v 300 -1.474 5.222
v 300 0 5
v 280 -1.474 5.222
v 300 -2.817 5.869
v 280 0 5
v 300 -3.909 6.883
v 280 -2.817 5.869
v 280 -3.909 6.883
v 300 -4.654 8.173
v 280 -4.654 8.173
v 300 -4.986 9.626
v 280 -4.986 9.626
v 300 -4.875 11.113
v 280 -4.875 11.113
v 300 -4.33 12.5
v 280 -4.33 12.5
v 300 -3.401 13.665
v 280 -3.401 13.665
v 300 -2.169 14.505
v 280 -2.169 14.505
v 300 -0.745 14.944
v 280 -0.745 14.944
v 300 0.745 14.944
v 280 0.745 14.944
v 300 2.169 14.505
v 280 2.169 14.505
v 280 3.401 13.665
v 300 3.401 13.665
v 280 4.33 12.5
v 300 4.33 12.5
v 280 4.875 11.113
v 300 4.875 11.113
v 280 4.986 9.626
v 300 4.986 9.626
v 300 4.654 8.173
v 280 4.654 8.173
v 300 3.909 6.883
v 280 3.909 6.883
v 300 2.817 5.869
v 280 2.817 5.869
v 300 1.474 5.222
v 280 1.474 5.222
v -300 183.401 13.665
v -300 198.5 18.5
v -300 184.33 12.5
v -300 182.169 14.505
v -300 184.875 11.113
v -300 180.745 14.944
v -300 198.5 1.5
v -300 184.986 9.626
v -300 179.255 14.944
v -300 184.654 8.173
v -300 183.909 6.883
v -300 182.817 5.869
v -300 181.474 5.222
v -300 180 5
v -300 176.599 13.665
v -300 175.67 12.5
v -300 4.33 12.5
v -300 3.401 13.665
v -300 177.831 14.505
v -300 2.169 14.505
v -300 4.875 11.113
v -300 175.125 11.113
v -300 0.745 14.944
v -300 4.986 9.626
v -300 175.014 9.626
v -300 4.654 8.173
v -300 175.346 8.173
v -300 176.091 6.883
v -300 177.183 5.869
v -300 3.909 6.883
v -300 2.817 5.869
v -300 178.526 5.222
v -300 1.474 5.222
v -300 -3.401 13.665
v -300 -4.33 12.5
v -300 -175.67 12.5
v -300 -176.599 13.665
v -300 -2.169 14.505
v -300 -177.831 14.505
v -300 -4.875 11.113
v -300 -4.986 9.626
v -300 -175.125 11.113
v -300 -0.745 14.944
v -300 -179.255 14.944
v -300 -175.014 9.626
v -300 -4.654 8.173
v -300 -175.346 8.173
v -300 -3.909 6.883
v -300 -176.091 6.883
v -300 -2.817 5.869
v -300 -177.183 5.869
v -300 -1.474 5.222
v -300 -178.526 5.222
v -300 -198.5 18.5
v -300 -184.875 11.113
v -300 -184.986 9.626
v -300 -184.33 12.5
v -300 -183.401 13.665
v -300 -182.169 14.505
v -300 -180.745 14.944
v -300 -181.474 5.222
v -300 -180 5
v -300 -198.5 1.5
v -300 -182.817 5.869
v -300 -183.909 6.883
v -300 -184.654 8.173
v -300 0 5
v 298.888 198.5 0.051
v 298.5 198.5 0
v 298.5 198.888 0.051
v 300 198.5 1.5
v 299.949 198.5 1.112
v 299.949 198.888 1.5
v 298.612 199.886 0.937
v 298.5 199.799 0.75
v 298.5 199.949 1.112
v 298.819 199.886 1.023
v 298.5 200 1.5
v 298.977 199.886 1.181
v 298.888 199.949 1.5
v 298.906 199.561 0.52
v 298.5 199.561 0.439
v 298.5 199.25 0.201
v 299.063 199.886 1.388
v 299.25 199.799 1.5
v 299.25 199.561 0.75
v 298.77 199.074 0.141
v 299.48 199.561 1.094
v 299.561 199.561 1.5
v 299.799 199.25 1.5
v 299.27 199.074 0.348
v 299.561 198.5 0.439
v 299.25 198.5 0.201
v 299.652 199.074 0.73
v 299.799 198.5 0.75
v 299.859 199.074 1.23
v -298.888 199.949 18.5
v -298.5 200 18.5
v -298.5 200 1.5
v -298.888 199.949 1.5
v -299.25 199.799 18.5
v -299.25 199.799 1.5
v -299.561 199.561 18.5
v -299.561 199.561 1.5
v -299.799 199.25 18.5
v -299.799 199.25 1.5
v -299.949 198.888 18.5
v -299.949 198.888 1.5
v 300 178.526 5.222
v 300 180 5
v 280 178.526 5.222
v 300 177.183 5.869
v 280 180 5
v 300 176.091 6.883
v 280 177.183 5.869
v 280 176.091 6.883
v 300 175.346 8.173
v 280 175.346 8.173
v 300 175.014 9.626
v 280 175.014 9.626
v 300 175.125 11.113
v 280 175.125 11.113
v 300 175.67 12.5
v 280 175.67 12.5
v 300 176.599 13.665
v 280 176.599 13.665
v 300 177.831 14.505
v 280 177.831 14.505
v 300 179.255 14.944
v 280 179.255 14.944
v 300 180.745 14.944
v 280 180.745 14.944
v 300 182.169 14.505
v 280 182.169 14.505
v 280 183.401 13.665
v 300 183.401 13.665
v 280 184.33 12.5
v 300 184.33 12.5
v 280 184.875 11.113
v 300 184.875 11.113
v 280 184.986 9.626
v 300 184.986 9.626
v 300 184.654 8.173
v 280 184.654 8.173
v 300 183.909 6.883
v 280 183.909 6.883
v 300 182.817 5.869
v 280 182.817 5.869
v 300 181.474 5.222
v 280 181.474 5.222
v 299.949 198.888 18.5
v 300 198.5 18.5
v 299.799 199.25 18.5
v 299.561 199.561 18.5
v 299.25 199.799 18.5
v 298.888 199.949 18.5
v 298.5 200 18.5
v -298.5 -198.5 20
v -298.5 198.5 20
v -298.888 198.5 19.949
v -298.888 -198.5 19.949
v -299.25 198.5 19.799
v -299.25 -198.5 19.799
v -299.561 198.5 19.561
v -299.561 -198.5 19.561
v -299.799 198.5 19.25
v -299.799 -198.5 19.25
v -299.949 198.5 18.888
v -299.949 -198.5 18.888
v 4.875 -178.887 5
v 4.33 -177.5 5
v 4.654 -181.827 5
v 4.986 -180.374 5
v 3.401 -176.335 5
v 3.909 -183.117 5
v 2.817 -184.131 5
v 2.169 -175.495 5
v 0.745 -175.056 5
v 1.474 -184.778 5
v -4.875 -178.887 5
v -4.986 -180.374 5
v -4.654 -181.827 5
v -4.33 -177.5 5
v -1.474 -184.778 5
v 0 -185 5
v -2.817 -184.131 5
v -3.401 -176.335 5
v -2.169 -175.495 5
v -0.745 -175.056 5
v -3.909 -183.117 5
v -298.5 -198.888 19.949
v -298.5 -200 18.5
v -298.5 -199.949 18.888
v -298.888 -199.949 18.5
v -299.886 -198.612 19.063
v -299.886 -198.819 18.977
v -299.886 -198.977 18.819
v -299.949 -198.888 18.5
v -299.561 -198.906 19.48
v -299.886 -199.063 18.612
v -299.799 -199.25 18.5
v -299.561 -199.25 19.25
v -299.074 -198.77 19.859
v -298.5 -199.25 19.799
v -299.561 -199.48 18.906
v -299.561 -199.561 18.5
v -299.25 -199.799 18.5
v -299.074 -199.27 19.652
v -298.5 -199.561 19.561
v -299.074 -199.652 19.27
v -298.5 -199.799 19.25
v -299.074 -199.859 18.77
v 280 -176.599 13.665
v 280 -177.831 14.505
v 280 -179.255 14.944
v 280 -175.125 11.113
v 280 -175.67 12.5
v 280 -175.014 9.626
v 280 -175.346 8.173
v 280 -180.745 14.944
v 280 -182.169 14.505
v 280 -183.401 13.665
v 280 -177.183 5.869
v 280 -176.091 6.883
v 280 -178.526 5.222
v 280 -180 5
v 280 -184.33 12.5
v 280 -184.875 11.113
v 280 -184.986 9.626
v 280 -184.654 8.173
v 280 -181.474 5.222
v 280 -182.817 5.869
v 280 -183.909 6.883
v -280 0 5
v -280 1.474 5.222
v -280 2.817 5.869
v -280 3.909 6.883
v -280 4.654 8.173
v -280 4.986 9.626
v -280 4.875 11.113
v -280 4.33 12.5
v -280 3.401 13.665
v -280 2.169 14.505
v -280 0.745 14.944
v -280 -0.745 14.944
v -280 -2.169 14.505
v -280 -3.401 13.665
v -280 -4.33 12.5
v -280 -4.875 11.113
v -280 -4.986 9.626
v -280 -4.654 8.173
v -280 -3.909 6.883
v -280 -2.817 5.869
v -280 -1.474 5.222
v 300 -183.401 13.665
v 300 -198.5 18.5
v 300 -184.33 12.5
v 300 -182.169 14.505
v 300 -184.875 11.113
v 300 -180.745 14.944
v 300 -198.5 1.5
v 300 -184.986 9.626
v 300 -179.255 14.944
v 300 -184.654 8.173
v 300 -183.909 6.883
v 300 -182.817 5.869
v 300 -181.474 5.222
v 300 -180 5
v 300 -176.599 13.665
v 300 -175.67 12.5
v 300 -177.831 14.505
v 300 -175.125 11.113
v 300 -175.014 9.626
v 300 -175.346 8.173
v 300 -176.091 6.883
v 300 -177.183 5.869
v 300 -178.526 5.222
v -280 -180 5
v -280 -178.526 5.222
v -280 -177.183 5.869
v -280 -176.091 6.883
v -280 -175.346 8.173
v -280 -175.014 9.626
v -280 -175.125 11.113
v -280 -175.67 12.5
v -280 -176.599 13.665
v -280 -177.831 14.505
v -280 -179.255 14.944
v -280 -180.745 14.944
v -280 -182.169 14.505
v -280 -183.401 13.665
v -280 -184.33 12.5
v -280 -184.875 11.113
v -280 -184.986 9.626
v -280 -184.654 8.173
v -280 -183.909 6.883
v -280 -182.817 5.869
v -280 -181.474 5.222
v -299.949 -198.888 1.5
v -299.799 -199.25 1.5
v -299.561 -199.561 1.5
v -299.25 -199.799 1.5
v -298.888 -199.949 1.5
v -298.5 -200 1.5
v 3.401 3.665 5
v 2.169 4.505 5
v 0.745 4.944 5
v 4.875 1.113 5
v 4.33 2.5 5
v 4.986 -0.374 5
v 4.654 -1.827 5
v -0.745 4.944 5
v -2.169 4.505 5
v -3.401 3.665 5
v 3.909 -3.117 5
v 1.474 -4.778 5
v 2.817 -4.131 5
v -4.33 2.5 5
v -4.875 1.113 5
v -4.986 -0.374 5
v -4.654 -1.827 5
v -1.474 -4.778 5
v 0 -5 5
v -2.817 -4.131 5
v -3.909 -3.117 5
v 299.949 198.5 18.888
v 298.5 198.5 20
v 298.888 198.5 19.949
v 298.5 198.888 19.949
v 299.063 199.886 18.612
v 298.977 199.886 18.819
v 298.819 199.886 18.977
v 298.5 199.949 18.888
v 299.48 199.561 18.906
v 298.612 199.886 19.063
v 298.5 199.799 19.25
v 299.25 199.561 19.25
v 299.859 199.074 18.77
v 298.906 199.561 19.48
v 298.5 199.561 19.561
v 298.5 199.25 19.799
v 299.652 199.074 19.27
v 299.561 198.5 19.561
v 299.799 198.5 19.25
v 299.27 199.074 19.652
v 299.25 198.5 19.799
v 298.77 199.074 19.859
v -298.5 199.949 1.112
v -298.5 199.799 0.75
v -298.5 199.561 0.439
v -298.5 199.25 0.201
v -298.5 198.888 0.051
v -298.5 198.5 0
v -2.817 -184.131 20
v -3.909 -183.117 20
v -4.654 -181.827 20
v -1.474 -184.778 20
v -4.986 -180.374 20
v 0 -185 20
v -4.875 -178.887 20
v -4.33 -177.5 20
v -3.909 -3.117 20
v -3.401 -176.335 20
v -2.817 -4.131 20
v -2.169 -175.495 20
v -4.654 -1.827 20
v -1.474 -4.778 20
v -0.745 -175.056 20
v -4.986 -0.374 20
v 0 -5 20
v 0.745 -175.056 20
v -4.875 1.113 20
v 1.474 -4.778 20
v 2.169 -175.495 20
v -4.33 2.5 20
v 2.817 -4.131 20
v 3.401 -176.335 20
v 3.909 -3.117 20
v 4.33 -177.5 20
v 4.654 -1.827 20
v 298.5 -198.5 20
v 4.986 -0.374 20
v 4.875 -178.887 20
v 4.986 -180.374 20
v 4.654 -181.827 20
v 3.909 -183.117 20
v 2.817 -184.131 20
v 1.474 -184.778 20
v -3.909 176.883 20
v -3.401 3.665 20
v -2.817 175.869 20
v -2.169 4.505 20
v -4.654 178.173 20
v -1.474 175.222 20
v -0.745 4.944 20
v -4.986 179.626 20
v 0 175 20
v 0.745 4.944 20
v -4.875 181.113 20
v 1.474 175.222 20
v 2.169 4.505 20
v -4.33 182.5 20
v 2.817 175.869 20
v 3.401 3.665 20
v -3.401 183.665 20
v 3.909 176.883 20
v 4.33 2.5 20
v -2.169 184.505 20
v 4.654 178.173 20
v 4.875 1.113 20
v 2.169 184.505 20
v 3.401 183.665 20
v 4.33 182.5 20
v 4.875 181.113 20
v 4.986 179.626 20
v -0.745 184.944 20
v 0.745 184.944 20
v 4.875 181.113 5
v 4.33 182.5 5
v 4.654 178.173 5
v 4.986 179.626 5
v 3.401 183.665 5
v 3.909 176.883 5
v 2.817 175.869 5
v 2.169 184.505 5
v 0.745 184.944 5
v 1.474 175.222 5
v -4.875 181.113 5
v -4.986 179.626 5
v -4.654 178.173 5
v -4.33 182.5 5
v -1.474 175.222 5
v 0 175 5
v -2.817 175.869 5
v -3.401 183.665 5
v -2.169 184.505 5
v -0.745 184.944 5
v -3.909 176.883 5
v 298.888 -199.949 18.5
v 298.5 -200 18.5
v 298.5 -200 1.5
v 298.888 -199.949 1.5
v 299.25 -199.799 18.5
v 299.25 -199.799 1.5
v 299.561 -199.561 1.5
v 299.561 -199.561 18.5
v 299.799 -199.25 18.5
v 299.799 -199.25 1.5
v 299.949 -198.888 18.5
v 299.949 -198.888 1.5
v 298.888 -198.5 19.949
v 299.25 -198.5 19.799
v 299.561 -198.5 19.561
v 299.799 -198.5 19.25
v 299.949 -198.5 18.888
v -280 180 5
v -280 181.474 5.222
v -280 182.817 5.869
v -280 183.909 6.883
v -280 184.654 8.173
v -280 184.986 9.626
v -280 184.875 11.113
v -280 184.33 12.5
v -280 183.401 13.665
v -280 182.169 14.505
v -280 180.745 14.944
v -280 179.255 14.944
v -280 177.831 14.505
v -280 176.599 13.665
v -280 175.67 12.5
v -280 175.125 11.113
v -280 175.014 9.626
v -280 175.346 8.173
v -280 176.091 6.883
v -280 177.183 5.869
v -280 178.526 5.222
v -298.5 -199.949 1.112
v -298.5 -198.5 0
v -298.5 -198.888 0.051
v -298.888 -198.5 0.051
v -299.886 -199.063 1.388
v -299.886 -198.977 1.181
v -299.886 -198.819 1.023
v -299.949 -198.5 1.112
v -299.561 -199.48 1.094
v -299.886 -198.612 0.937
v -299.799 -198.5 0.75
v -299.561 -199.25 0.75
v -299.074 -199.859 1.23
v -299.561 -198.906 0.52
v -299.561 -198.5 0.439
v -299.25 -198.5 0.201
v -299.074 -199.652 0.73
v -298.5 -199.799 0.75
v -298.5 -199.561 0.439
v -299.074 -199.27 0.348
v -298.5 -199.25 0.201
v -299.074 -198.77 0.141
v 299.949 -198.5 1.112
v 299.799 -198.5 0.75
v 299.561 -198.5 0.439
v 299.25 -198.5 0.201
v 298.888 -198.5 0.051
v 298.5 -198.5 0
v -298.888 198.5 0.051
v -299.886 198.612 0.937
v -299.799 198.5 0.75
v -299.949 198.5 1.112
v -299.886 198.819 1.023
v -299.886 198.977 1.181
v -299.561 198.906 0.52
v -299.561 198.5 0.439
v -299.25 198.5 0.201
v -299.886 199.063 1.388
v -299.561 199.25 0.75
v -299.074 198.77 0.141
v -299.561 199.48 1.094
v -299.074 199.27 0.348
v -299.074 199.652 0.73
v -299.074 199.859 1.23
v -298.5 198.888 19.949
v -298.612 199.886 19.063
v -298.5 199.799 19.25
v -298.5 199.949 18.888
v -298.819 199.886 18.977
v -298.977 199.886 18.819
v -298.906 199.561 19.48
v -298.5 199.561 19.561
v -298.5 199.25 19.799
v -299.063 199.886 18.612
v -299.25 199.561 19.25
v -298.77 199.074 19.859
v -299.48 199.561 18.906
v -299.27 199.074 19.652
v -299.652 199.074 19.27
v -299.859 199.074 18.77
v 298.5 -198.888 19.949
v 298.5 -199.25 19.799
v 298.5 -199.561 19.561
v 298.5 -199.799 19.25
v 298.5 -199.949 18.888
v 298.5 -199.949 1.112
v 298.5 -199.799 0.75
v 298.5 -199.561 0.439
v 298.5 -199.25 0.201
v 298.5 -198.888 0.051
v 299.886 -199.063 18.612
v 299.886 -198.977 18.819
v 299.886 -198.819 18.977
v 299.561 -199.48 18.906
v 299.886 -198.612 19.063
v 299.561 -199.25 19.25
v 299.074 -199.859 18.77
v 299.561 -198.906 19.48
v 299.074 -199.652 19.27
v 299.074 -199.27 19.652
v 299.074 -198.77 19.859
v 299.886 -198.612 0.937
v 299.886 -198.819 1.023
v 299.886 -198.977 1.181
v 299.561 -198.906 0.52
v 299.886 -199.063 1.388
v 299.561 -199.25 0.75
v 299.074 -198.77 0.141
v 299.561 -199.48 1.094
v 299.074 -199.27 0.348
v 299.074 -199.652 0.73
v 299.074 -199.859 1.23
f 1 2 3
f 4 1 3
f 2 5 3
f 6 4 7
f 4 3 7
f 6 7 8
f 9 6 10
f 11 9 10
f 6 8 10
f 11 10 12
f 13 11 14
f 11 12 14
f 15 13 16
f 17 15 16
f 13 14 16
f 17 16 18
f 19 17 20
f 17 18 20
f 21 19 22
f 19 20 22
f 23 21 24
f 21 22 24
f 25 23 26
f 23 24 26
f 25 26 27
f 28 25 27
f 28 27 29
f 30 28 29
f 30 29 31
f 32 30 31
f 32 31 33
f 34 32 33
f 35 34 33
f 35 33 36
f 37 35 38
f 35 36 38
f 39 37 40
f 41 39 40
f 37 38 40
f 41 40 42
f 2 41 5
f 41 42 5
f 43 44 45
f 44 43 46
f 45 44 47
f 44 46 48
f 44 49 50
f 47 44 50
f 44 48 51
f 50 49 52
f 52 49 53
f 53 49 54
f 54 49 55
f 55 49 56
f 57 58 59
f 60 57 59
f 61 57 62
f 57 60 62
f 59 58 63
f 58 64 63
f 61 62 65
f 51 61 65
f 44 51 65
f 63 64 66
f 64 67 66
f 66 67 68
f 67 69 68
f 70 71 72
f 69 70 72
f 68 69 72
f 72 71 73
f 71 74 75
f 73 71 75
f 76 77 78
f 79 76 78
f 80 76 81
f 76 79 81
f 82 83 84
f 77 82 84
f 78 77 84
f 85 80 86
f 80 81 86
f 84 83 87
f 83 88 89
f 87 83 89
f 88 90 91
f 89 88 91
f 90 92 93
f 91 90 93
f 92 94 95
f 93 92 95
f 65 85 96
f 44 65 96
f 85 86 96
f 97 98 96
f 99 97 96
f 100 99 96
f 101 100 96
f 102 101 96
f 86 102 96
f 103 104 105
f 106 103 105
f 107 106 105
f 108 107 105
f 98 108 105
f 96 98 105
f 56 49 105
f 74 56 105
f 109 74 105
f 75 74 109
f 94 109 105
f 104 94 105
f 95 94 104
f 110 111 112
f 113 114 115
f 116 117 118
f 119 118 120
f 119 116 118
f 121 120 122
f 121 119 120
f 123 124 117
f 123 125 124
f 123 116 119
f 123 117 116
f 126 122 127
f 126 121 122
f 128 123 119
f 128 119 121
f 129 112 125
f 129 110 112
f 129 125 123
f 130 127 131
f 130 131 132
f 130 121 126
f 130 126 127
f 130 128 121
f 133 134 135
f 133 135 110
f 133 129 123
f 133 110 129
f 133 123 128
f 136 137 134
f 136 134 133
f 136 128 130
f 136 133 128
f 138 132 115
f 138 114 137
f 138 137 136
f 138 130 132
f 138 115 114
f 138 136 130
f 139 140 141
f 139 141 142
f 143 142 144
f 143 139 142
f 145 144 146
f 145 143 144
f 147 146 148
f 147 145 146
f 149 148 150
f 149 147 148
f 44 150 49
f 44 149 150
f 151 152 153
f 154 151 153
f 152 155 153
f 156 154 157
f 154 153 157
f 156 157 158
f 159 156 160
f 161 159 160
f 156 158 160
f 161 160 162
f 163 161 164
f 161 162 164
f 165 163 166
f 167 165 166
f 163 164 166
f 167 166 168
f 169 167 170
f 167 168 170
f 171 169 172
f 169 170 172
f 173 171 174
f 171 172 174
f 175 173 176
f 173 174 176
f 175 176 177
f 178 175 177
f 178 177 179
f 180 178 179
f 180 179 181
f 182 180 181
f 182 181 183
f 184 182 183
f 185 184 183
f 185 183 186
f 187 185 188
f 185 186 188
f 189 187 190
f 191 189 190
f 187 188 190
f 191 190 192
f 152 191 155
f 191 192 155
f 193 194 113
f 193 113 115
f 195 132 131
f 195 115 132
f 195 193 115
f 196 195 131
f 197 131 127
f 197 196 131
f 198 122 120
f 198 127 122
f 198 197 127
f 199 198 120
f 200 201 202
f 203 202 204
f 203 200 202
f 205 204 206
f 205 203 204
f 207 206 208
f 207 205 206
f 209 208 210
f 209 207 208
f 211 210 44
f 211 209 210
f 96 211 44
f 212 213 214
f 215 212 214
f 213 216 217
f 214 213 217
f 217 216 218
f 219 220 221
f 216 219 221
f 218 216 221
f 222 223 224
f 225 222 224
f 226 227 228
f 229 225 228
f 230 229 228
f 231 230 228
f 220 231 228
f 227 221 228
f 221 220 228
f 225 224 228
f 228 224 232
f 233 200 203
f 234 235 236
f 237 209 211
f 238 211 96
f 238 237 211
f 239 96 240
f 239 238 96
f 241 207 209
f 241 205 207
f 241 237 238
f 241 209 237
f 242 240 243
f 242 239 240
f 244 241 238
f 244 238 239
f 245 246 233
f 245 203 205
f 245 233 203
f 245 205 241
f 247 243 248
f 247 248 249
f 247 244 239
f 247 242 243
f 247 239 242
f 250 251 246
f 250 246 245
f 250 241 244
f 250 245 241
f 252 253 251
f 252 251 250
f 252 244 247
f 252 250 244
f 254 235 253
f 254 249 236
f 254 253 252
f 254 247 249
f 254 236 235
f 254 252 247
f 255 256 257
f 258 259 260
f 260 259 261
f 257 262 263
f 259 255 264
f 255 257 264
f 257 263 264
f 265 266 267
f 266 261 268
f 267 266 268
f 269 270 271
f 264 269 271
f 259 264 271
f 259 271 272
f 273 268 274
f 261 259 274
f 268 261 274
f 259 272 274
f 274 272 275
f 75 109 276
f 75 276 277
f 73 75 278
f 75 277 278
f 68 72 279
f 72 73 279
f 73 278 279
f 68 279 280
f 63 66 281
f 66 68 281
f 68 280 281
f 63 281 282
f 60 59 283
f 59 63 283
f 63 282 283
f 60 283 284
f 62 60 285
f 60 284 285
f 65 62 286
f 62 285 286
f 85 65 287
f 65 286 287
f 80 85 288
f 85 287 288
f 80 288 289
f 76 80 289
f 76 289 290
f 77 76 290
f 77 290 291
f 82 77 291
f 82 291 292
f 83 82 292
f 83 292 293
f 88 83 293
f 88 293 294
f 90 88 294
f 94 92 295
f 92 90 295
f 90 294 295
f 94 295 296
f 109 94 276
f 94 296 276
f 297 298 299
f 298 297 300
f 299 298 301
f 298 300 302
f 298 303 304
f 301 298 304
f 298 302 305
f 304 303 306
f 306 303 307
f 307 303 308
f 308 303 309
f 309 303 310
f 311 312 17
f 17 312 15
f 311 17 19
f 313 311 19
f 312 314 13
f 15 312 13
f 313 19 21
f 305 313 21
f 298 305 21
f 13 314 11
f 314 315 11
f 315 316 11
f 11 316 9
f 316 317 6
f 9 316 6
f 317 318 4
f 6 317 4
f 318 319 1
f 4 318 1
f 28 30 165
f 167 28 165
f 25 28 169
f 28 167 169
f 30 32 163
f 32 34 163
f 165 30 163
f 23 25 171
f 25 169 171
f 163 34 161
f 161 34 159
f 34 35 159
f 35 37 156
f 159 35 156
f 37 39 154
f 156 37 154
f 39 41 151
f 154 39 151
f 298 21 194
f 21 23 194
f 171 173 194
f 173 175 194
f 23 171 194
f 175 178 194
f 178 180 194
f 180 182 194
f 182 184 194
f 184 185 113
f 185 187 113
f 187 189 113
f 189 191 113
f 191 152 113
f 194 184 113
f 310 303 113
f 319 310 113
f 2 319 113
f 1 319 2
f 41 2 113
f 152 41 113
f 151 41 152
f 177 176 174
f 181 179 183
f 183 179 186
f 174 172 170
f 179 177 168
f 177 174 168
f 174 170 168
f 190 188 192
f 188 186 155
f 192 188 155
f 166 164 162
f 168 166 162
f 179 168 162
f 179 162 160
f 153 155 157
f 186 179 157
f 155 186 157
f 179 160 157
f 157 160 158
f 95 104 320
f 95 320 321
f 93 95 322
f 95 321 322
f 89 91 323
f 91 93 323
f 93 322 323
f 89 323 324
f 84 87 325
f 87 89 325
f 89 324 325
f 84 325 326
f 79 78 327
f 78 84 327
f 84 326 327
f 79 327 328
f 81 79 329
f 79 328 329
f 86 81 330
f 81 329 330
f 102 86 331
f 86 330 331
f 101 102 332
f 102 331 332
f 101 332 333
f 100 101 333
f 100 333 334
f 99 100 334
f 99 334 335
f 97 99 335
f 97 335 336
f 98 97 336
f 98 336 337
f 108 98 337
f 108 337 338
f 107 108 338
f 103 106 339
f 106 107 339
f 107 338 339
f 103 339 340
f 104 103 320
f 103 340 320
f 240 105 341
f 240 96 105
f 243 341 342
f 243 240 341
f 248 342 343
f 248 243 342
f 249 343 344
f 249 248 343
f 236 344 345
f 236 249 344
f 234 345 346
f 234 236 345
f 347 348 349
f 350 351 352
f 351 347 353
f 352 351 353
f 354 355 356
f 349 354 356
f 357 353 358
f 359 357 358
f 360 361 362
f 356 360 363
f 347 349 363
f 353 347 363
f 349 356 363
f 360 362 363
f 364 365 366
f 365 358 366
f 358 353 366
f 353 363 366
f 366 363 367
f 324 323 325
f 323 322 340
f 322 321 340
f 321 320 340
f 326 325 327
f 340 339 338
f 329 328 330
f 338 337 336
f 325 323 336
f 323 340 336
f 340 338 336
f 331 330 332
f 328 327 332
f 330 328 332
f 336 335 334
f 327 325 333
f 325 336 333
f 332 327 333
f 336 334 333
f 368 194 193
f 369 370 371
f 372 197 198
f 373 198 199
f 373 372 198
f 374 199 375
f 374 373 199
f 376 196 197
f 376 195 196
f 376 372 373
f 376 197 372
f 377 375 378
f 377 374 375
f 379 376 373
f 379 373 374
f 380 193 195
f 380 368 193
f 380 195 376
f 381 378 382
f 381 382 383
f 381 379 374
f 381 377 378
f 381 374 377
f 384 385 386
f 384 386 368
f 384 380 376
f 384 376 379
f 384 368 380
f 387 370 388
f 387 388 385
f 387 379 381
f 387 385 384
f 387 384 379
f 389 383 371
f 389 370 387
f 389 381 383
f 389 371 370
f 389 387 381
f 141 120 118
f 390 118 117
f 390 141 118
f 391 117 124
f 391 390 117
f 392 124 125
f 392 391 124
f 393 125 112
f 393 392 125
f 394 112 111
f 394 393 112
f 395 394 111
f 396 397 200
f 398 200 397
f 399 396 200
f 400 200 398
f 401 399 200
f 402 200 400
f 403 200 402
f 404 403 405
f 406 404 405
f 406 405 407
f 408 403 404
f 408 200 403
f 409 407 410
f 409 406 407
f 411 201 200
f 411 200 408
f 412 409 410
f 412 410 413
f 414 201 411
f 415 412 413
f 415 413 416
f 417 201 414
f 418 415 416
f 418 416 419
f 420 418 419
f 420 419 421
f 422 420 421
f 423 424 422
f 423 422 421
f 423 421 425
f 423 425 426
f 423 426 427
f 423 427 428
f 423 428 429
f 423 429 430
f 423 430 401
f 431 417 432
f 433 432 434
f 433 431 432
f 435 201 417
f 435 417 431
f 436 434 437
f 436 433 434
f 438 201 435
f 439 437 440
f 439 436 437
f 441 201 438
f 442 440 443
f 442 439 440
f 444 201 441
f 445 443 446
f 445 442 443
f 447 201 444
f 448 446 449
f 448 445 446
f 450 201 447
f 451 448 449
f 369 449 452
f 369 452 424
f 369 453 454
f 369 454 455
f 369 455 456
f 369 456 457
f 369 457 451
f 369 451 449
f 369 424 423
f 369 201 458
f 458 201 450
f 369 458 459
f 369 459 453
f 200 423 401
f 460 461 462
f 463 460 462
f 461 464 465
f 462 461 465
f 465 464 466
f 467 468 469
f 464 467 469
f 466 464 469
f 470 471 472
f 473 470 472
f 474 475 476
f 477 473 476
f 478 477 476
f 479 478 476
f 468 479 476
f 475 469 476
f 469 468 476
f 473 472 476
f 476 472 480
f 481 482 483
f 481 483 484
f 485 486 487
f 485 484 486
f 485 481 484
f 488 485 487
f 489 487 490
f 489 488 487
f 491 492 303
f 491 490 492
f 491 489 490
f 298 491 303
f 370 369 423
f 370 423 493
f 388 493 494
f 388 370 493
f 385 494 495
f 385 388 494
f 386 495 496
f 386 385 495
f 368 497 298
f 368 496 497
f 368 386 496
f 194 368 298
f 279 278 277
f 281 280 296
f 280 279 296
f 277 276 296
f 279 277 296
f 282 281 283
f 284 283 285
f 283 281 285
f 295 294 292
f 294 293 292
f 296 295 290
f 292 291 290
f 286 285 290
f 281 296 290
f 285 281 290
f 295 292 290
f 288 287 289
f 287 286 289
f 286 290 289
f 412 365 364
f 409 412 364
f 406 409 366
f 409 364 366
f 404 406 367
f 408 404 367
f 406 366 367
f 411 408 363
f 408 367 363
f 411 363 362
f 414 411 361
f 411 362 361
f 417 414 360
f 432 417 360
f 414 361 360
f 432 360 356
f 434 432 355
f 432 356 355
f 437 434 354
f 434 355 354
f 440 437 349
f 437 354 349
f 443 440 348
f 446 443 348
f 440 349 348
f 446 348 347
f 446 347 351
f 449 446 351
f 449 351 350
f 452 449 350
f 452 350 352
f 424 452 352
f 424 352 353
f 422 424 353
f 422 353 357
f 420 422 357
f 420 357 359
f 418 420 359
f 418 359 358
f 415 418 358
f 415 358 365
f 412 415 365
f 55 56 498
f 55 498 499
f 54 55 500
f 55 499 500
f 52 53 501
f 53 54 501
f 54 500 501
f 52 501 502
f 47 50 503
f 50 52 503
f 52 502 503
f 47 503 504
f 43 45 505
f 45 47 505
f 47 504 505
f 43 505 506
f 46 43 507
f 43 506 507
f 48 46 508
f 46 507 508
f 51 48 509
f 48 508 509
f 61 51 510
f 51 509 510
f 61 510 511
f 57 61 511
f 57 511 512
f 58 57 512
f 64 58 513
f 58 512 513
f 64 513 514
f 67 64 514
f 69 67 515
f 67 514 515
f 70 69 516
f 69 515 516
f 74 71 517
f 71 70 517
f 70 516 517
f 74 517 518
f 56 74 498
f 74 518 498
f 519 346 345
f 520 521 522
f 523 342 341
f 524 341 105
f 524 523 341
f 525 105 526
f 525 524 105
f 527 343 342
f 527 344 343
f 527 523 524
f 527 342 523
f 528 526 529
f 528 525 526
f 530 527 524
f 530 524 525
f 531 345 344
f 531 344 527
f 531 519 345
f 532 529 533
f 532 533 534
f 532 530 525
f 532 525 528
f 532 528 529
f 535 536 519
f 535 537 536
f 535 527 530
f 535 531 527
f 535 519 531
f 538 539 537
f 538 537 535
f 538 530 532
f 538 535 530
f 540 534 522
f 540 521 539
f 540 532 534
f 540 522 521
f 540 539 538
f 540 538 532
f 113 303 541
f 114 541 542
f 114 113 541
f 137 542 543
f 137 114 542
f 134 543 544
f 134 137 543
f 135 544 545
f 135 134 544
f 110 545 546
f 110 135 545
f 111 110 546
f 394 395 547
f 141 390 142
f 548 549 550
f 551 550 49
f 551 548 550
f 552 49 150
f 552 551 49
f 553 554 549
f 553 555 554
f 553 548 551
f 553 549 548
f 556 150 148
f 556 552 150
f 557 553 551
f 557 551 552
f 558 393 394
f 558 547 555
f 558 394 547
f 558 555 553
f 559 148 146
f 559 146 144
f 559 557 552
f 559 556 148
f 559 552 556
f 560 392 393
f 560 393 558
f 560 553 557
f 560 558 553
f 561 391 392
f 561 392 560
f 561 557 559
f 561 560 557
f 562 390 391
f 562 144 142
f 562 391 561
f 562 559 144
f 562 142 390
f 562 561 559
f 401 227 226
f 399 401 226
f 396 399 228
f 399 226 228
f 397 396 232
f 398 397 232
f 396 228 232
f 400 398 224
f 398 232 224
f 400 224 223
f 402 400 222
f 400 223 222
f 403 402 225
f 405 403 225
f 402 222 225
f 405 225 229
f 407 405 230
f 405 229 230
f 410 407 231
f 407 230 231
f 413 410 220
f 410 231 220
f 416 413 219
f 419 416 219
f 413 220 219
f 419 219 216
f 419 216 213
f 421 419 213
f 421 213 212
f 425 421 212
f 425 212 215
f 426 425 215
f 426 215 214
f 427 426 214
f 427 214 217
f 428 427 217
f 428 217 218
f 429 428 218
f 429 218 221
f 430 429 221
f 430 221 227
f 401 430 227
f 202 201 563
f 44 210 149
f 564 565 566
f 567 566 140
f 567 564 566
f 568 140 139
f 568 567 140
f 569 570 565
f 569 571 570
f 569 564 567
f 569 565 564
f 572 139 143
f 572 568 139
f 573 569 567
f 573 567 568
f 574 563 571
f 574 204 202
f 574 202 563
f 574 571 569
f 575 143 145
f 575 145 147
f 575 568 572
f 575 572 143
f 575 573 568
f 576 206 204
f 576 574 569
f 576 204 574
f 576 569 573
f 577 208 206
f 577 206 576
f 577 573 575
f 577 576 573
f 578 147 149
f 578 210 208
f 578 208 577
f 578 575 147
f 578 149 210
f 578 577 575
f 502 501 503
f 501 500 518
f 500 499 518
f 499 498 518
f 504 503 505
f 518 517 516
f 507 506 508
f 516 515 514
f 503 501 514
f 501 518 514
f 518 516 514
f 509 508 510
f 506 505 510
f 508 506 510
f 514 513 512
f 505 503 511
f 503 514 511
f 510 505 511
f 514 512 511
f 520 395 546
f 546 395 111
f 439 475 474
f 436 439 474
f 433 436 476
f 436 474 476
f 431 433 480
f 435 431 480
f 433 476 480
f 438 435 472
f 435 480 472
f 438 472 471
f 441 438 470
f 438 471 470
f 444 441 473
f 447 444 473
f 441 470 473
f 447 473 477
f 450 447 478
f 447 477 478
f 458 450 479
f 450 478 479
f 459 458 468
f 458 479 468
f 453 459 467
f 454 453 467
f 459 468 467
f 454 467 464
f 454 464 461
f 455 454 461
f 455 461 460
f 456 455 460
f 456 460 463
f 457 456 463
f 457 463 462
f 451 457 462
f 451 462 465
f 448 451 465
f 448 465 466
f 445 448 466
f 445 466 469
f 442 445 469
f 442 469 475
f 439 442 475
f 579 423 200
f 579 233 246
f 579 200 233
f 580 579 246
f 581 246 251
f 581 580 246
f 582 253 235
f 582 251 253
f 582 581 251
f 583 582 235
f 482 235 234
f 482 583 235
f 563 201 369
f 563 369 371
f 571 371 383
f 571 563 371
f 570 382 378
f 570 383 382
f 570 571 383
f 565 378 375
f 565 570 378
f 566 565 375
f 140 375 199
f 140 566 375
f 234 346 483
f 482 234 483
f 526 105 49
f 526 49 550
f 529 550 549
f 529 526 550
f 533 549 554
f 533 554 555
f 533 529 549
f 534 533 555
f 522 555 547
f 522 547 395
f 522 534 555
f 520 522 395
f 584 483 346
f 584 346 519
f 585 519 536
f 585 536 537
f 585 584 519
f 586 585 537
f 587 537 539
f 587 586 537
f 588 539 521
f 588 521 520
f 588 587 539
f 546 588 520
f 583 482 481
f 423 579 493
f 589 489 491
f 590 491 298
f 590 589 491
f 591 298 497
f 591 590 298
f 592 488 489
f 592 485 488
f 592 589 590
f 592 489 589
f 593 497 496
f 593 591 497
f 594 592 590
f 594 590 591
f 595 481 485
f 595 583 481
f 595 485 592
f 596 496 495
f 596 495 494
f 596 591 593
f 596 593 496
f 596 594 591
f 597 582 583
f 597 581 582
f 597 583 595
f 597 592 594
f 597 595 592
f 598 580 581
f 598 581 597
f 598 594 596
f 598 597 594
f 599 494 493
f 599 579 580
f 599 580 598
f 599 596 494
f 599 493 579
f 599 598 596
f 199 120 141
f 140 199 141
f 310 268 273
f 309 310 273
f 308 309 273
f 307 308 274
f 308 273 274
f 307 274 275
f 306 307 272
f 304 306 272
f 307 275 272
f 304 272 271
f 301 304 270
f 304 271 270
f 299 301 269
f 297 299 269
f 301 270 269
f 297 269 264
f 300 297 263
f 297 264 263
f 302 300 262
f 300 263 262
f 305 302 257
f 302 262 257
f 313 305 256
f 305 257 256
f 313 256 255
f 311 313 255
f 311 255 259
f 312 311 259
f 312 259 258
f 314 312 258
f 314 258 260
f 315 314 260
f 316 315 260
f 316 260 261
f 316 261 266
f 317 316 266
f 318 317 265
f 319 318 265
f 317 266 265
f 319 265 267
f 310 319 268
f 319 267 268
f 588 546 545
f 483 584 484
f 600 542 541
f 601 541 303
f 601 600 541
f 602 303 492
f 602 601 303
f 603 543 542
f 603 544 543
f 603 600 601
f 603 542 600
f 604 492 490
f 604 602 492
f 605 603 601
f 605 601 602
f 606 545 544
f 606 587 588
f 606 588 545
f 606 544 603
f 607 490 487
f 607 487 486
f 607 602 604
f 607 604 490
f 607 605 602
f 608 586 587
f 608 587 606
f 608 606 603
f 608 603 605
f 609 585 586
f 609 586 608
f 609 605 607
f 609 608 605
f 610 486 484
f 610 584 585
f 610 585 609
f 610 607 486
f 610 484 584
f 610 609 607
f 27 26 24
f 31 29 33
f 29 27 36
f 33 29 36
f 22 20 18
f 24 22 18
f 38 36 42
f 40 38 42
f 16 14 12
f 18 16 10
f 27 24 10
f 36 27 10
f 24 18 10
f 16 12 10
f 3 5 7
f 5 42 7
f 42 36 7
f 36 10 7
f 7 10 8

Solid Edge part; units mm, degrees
sketch "Sketch1" plane through (0, 0, 0) normal (0, 0, 1) x (1, 0, 0)
  line L0 (-300, -200) -> (300, -200)
  line L1 (300, -200) -> (300, 200)
  line L2 (300, 200) -> (-300, 200)
  line L3 (-300, 200) -> (-300, -200)
extrude "Protrusion1" add sketch "Sketch1" along normal blind 20
fillet "Round_1" radius 1.5 12 edges at (0, -200, 20) (0, -200, 0) (-300, -200, 10) (300, -200, 10) (300, 0, 20) (300, 0, 0) (-300, 0, 20) (0, 200, 20) (300, 200, 10) (0, 200, 0) (-300, 200, 10) (-300, 0, 0)
hole "Hole_1" at (0, -180, 20) direction (0, 0, -1) diameter 10 depth 15
hole "Hole1" at (0, 0, 20) direction (0, 0, -1) diameter 10 depth 15
hole "Hole2" at (0, 180, 20) direction (0, 0, -1) diameter 10 depth 15
hole "Hole_4" at (300, 0, 10) direction (-1, 0, 0) diameter 10 depth 20
hole "Hole3" at (300, 180, 10) direction (-1, 0, 0) diameter 10 depth 20
hole "Hole4" at (300, -180, 10) direction (-1, 0, 0) diameter 10 depth 20
mirror "Mirror1" about plane through (0, 0, 0) normal (1, 0, 0) of "Hole_4", "Hole3", "Hole4"
properties material "Wood, Oak"
